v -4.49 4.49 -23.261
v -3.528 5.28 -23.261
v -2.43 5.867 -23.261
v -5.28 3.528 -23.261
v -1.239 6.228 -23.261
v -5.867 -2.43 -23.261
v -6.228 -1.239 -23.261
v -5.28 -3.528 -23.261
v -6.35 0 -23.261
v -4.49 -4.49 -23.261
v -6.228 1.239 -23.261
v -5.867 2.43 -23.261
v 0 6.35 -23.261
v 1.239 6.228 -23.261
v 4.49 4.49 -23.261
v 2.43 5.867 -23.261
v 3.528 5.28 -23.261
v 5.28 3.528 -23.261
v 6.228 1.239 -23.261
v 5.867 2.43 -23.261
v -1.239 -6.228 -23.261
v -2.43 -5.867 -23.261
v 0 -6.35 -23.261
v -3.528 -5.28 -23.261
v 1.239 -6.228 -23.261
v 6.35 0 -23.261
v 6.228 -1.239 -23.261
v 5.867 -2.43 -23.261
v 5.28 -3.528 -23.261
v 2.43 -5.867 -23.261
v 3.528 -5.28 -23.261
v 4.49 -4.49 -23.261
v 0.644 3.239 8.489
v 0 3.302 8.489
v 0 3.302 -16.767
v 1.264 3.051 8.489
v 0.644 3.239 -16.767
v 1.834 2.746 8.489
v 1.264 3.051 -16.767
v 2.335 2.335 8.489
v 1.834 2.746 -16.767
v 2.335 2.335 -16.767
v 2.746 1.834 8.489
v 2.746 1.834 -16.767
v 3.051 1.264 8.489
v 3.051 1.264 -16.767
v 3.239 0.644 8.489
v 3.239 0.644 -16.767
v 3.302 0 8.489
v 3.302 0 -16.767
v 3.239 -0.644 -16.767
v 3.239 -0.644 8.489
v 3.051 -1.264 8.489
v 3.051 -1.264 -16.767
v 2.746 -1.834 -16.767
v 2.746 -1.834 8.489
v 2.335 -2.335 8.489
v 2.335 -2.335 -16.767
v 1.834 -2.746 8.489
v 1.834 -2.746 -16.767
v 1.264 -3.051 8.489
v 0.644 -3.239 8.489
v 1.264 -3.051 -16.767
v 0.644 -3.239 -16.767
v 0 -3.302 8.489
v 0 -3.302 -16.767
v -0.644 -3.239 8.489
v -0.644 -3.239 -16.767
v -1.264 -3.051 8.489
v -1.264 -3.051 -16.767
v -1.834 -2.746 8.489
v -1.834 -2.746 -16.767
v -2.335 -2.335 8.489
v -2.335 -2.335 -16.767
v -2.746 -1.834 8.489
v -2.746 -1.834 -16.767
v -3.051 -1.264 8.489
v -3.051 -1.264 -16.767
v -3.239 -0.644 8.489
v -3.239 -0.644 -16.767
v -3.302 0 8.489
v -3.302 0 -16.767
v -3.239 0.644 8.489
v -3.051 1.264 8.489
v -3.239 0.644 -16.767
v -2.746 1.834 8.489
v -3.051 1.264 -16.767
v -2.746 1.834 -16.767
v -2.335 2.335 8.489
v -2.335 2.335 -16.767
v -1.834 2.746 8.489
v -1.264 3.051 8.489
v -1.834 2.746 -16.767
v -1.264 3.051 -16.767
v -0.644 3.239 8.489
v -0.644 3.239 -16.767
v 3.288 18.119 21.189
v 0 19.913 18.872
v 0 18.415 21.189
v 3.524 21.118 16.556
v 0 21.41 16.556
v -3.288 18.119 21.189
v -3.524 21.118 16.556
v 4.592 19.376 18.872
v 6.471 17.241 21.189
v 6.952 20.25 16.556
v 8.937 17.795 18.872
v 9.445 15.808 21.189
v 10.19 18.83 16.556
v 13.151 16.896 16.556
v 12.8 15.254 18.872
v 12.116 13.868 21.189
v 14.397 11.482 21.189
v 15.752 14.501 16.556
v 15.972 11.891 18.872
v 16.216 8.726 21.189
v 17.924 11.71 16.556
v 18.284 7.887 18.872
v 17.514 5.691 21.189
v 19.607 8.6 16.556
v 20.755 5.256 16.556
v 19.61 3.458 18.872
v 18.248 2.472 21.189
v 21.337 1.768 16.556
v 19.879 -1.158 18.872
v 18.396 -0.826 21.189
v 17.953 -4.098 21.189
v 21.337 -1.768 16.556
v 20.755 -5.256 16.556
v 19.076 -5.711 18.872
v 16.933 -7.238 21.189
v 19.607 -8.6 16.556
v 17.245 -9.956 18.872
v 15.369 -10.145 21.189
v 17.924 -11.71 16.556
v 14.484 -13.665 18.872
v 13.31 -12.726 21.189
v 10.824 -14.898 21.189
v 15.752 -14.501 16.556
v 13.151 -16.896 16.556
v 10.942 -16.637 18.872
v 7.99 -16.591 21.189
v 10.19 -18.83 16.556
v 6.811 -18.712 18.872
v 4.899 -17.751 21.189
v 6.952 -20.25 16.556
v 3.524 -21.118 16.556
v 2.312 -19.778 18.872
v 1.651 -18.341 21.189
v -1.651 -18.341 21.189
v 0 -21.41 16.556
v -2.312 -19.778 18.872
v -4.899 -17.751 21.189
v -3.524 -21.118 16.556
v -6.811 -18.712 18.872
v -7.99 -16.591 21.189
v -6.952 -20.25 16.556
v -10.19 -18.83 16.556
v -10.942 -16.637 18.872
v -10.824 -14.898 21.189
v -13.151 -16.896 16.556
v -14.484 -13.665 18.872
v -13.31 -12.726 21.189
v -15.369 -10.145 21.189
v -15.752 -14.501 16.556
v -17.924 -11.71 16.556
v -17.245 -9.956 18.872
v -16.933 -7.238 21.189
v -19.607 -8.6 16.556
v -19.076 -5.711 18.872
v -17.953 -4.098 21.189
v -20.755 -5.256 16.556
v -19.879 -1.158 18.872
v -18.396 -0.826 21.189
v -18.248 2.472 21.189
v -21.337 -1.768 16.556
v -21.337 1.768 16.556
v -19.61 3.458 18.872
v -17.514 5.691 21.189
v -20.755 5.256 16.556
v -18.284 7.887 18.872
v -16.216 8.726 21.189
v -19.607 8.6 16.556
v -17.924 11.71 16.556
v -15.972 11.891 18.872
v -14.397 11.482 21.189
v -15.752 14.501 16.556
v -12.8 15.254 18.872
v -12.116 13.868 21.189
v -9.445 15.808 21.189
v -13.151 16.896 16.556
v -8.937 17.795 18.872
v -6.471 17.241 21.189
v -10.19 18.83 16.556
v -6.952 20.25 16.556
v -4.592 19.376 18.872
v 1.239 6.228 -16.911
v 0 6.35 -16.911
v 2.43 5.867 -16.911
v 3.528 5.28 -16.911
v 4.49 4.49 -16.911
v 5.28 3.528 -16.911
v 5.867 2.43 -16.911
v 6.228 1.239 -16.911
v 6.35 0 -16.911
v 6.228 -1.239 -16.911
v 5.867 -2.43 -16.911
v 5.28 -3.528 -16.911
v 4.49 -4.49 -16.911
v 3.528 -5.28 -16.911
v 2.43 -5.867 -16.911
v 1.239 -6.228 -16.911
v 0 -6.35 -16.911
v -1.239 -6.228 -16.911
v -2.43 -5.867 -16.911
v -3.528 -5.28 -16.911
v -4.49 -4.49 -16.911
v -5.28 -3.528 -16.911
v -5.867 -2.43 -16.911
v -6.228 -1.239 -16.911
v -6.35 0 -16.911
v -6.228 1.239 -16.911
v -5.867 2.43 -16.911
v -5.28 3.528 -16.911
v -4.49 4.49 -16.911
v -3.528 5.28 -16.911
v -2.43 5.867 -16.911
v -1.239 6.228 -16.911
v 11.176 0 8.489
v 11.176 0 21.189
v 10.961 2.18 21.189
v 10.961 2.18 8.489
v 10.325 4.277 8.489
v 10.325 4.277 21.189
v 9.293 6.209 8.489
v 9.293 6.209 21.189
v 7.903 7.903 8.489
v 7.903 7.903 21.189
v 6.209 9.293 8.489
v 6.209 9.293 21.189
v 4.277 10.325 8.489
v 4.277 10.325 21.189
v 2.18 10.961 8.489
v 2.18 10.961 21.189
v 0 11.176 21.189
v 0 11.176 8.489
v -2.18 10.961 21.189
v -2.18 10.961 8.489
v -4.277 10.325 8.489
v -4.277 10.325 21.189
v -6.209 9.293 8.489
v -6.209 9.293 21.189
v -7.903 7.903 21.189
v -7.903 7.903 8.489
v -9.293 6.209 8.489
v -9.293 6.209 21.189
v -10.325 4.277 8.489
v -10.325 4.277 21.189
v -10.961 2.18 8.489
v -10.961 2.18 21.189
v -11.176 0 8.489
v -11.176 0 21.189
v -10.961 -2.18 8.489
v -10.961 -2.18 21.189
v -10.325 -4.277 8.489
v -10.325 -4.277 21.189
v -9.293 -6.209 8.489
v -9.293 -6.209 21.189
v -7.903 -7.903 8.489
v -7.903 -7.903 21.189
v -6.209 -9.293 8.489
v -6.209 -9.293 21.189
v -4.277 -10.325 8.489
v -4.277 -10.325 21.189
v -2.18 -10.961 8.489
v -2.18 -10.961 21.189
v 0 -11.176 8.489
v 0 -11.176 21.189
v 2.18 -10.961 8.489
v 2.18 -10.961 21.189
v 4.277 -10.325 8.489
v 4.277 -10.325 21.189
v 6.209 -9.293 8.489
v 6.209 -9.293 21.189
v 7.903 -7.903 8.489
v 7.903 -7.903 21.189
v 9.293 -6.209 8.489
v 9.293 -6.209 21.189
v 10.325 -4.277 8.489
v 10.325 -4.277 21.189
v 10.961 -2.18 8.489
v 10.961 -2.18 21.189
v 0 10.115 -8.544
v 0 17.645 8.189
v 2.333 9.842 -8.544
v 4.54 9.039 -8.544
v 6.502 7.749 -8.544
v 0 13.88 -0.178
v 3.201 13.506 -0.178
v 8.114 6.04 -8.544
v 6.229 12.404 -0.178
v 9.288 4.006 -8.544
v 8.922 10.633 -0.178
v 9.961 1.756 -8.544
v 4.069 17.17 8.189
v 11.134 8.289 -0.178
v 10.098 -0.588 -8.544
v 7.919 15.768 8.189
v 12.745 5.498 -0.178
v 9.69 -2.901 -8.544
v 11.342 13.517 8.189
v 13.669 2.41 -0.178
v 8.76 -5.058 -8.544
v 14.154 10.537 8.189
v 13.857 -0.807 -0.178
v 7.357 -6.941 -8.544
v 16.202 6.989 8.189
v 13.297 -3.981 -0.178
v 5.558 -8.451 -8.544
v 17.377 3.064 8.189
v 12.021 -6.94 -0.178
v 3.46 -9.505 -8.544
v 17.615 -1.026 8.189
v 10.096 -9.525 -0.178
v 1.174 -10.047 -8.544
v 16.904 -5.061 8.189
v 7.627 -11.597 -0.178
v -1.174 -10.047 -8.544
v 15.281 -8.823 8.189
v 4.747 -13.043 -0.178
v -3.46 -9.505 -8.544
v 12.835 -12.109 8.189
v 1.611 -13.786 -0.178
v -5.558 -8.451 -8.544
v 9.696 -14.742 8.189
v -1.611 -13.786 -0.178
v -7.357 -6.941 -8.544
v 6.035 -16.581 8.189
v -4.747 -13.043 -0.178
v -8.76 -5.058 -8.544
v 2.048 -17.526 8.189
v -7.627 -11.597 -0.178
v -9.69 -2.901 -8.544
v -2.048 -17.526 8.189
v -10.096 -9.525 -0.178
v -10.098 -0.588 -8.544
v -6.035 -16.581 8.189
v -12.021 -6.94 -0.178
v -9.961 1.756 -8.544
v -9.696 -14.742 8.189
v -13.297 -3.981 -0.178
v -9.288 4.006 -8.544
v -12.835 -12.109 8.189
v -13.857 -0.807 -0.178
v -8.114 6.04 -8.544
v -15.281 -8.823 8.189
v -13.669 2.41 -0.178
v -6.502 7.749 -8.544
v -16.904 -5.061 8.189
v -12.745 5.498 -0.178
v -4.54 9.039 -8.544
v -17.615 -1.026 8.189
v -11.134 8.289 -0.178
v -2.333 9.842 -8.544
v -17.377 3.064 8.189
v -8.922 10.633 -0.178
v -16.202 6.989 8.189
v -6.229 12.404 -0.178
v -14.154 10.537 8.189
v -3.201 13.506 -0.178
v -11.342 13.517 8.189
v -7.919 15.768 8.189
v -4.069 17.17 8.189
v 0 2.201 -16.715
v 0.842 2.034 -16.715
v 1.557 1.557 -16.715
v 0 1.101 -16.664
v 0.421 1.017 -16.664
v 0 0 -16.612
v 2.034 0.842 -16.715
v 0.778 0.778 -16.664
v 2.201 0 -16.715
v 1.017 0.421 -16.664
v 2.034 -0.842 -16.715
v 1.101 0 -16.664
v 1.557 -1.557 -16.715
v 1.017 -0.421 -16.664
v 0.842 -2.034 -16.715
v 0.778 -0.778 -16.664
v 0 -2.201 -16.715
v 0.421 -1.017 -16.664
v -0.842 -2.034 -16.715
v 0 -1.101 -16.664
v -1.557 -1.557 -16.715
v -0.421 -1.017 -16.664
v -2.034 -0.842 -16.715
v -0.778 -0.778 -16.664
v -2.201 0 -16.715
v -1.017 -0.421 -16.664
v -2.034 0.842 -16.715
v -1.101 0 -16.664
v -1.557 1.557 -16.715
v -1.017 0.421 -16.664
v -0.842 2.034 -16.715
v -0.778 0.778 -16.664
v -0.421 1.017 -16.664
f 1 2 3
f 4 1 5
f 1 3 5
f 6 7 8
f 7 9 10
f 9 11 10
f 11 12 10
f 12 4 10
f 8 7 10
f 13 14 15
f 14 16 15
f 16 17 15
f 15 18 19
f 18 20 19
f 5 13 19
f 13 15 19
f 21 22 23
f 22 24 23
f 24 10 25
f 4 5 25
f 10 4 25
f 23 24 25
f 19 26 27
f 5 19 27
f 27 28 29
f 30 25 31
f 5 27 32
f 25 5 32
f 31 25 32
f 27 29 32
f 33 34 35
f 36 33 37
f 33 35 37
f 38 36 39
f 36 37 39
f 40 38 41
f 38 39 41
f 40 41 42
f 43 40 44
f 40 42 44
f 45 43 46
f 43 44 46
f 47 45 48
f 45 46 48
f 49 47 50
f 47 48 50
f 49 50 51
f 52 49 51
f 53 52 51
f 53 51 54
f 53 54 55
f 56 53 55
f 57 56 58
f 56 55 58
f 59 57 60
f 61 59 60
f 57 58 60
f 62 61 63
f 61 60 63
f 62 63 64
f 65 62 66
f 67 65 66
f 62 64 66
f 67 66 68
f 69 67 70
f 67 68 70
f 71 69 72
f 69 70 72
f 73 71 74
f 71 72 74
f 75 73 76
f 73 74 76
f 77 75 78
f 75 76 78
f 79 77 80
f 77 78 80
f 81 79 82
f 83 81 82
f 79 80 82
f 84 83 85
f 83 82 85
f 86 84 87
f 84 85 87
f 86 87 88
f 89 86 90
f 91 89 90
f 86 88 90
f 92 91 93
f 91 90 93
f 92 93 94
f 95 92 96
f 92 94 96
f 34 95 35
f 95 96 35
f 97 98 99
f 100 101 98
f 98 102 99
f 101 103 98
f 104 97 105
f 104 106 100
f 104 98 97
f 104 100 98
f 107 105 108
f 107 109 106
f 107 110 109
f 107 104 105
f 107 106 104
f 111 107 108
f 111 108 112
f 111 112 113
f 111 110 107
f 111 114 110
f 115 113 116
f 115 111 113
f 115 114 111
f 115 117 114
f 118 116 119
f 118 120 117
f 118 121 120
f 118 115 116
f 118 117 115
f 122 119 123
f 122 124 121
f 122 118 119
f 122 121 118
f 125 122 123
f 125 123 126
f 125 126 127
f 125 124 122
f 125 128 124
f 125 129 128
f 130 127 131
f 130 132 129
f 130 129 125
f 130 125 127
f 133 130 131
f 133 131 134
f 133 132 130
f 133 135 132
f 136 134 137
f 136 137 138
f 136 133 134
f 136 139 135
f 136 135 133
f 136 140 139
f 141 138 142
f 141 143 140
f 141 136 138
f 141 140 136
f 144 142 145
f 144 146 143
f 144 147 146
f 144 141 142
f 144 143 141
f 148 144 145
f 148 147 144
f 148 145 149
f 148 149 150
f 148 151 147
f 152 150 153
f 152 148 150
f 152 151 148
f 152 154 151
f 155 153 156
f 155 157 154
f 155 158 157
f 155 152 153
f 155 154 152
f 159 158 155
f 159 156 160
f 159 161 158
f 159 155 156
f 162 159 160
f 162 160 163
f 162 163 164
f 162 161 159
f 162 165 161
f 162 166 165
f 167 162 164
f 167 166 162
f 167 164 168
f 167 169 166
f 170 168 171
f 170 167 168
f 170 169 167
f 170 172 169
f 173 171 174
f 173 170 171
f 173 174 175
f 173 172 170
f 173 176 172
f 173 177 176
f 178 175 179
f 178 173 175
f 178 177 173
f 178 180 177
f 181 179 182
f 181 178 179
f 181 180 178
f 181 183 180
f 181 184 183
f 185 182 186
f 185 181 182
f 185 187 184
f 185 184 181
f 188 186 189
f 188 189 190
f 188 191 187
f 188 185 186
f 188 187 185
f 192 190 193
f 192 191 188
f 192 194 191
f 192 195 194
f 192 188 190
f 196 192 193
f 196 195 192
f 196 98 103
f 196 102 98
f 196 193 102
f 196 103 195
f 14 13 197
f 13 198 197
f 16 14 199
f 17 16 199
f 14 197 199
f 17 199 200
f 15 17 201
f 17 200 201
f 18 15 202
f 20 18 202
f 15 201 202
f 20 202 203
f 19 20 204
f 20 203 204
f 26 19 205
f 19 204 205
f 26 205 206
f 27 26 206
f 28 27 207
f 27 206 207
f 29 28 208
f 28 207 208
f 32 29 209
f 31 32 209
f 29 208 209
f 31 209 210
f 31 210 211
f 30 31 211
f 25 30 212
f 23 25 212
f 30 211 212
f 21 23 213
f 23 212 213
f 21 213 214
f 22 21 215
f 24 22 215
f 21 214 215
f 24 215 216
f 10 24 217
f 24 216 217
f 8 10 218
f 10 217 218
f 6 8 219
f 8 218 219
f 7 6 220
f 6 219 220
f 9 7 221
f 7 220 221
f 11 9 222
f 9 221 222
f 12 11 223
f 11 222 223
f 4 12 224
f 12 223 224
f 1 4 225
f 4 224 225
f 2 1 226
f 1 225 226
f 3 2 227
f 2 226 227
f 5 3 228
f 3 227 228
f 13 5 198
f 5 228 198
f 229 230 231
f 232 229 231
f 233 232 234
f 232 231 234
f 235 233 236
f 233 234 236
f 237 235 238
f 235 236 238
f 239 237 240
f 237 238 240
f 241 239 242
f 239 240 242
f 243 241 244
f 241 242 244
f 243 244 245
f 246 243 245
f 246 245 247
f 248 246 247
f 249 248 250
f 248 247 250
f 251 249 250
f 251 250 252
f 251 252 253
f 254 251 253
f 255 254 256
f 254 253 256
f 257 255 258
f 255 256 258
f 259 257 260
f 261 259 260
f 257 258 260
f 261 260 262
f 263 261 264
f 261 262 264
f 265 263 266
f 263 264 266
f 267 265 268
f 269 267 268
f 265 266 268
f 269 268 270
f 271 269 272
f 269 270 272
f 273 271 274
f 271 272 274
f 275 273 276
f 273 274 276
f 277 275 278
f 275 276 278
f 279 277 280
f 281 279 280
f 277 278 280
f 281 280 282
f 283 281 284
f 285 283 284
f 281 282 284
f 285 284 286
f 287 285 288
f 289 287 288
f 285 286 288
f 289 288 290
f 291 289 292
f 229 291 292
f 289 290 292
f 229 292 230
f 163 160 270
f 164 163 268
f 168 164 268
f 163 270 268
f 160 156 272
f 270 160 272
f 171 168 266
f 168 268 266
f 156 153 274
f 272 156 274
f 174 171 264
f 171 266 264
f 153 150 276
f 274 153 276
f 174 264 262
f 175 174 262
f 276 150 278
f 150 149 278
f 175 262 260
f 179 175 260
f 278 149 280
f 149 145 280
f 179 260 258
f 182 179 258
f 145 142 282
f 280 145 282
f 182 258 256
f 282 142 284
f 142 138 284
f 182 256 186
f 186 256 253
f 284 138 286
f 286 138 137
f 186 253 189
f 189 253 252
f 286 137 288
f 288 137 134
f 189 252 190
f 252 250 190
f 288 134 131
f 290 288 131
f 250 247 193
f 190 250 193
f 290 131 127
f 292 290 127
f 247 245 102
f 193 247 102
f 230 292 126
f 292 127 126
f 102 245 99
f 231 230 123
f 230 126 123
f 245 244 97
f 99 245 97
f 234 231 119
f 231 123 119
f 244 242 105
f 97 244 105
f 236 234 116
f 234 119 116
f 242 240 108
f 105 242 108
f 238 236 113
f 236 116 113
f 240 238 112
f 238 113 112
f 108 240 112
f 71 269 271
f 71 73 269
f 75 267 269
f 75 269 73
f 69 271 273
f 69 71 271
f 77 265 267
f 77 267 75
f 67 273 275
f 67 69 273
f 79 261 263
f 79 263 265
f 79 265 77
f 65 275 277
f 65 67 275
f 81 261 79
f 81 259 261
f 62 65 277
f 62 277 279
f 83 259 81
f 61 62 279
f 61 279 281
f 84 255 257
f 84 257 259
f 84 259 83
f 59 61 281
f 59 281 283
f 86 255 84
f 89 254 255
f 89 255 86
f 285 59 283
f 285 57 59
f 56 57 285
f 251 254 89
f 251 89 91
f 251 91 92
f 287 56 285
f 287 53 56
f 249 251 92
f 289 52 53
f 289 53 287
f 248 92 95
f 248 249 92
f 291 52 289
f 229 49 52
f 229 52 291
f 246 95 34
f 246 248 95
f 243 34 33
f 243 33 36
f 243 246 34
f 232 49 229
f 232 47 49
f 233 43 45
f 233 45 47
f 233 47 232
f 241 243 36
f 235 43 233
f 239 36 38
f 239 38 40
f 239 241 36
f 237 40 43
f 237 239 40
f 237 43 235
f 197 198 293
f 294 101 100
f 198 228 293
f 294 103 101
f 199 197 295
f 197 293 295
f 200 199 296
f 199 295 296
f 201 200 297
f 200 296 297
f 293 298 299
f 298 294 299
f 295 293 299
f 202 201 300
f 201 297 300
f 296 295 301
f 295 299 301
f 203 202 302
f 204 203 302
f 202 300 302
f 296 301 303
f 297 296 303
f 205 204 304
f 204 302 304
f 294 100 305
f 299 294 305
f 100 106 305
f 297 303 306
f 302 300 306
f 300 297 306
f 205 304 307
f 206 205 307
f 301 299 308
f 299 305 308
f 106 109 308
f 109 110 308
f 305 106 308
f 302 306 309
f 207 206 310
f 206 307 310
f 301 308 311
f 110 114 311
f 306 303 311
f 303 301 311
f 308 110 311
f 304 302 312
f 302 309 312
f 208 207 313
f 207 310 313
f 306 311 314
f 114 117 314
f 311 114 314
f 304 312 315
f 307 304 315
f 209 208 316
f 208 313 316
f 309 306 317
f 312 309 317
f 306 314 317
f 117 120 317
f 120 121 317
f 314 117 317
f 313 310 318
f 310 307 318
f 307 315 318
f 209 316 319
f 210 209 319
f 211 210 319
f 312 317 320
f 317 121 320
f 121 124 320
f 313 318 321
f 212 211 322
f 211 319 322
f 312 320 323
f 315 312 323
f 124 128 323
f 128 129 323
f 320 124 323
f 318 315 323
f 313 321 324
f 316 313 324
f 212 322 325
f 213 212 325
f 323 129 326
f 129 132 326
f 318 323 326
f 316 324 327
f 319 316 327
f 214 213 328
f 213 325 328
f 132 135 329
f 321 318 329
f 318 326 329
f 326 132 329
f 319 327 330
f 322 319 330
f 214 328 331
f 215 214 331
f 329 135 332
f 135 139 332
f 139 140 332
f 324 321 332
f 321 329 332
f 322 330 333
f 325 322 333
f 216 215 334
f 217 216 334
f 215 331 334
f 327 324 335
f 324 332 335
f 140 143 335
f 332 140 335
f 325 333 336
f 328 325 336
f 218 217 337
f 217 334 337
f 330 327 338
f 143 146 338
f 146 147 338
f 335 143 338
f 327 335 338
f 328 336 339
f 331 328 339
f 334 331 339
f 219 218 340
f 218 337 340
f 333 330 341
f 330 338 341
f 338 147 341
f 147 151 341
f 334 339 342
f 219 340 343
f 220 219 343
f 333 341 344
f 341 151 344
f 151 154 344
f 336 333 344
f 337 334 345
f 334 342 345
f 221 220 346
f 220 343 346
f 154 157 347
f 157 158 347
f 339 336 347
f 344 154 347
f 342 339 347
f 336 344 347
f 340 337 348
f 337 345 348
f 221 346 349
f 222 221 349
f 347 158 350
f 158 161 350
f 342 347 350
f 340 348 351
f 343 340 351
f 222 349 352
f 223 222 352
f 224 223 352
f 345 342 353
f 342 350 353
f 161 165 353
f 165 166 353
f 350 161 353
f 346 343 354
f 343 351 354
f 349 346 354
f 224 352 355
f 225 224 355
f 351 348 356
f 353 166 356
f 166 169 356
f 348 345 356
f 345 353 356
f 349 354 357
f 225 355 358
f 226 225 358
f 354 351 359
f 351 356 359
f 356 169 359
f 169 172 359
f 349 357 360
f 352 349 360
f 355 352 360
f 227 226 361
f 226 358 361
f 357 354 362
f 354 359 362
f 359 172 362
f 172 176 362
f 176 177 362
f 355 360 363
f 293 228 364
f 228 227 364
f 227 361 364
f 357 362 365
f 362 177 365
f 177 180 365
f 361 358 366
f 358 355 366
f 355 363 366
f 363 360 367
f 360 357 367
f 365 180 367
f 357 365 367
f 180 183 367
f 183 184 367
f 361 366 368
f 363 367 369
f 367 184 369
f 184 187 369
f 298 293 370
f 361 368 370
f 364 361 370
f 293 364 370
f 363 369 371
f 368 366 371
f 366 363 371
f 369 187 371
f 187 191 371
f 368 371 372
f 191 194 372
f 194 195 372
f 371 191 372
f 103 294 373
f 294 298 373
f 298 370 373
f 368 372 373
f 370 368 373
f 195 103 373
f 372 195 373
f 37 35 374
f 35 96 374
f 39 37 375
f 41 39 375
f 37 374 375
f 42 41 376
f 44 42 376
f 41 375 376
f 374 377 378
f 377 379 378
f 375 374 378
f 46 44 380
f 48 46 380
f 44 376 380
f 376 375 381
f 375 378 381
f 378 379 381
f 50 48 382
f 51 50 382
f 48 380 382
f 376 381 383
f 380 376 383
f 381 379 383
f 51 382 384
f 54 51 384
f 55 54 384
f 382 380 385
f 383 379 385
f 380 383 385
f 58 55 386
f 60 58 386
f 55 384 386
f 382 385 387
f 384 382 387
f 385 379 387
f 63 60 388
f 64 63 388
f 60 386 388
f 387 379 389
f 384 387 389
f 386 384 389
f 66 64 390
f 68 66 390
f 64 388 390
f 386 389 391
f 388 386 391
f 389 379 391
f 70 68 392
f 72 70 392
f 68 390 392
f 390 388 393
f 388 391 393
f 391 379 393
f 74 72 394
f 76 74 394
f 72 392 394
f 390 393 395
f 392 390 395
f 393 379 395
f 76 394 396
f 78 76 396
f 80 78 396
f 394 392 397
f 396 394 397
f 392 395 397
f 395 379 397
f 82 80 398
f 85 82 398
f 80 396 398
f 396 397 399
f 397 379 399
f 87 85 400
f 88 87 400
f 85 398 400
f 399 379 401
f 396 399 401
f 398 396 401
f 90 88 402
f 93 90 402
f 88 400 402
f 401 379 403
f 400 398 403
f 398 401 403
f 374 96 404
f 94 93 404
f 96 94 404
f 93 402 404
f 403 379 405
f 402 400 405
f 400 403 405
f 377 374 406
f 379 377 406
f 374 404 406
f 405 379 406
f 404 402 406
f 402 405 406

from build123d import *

# Parameters (mm, degrees)
F2_R     = 11.176
F2_R_2   = 3.302
F3_DEPTH = 12.7
F4_SIZE  = 5.08


with BuildPart() as f1:
    # F0 (on Right) → F1 (revolve)
    with BuildSketch(Plane.YZ):
        Polygon((23.495, 21.188779), (3.302, 21.188779), (3.302, -16.767403), (6.35, -16.911221), align=None)
        Polygon((6.35, -16.911221), (3.302, -16.767403), (3.302, -23.261221), (6.35, -23.261221), align=None)
        Polygon((3.302, -23.261221), (3.302, -16.767403), (0, -16.6116), (0, -23.261221), align=None)
    revolve(axis=Axis((0, 0, 4.724398), (0, 0, -1)))

    # F2 (on face) → F3 (cut)
    with BuildSketch(Plane.XY.offset(21.188779)):
        Circle(F2_R)
        Circle(F2_R_2, mode=Mode.SUBTRACT)
    extrude(amount=-F3_DEPTH, mode=Mode.SUBTRACT)

    # F4
    f4_edges = [f1.edges().sort_by_distance(p)[0] for p in [
        (0, -23.495, 21.188779),
    ]]
    chamfer(f4_edges, length=F4_SIZE)


solid = f1.part
